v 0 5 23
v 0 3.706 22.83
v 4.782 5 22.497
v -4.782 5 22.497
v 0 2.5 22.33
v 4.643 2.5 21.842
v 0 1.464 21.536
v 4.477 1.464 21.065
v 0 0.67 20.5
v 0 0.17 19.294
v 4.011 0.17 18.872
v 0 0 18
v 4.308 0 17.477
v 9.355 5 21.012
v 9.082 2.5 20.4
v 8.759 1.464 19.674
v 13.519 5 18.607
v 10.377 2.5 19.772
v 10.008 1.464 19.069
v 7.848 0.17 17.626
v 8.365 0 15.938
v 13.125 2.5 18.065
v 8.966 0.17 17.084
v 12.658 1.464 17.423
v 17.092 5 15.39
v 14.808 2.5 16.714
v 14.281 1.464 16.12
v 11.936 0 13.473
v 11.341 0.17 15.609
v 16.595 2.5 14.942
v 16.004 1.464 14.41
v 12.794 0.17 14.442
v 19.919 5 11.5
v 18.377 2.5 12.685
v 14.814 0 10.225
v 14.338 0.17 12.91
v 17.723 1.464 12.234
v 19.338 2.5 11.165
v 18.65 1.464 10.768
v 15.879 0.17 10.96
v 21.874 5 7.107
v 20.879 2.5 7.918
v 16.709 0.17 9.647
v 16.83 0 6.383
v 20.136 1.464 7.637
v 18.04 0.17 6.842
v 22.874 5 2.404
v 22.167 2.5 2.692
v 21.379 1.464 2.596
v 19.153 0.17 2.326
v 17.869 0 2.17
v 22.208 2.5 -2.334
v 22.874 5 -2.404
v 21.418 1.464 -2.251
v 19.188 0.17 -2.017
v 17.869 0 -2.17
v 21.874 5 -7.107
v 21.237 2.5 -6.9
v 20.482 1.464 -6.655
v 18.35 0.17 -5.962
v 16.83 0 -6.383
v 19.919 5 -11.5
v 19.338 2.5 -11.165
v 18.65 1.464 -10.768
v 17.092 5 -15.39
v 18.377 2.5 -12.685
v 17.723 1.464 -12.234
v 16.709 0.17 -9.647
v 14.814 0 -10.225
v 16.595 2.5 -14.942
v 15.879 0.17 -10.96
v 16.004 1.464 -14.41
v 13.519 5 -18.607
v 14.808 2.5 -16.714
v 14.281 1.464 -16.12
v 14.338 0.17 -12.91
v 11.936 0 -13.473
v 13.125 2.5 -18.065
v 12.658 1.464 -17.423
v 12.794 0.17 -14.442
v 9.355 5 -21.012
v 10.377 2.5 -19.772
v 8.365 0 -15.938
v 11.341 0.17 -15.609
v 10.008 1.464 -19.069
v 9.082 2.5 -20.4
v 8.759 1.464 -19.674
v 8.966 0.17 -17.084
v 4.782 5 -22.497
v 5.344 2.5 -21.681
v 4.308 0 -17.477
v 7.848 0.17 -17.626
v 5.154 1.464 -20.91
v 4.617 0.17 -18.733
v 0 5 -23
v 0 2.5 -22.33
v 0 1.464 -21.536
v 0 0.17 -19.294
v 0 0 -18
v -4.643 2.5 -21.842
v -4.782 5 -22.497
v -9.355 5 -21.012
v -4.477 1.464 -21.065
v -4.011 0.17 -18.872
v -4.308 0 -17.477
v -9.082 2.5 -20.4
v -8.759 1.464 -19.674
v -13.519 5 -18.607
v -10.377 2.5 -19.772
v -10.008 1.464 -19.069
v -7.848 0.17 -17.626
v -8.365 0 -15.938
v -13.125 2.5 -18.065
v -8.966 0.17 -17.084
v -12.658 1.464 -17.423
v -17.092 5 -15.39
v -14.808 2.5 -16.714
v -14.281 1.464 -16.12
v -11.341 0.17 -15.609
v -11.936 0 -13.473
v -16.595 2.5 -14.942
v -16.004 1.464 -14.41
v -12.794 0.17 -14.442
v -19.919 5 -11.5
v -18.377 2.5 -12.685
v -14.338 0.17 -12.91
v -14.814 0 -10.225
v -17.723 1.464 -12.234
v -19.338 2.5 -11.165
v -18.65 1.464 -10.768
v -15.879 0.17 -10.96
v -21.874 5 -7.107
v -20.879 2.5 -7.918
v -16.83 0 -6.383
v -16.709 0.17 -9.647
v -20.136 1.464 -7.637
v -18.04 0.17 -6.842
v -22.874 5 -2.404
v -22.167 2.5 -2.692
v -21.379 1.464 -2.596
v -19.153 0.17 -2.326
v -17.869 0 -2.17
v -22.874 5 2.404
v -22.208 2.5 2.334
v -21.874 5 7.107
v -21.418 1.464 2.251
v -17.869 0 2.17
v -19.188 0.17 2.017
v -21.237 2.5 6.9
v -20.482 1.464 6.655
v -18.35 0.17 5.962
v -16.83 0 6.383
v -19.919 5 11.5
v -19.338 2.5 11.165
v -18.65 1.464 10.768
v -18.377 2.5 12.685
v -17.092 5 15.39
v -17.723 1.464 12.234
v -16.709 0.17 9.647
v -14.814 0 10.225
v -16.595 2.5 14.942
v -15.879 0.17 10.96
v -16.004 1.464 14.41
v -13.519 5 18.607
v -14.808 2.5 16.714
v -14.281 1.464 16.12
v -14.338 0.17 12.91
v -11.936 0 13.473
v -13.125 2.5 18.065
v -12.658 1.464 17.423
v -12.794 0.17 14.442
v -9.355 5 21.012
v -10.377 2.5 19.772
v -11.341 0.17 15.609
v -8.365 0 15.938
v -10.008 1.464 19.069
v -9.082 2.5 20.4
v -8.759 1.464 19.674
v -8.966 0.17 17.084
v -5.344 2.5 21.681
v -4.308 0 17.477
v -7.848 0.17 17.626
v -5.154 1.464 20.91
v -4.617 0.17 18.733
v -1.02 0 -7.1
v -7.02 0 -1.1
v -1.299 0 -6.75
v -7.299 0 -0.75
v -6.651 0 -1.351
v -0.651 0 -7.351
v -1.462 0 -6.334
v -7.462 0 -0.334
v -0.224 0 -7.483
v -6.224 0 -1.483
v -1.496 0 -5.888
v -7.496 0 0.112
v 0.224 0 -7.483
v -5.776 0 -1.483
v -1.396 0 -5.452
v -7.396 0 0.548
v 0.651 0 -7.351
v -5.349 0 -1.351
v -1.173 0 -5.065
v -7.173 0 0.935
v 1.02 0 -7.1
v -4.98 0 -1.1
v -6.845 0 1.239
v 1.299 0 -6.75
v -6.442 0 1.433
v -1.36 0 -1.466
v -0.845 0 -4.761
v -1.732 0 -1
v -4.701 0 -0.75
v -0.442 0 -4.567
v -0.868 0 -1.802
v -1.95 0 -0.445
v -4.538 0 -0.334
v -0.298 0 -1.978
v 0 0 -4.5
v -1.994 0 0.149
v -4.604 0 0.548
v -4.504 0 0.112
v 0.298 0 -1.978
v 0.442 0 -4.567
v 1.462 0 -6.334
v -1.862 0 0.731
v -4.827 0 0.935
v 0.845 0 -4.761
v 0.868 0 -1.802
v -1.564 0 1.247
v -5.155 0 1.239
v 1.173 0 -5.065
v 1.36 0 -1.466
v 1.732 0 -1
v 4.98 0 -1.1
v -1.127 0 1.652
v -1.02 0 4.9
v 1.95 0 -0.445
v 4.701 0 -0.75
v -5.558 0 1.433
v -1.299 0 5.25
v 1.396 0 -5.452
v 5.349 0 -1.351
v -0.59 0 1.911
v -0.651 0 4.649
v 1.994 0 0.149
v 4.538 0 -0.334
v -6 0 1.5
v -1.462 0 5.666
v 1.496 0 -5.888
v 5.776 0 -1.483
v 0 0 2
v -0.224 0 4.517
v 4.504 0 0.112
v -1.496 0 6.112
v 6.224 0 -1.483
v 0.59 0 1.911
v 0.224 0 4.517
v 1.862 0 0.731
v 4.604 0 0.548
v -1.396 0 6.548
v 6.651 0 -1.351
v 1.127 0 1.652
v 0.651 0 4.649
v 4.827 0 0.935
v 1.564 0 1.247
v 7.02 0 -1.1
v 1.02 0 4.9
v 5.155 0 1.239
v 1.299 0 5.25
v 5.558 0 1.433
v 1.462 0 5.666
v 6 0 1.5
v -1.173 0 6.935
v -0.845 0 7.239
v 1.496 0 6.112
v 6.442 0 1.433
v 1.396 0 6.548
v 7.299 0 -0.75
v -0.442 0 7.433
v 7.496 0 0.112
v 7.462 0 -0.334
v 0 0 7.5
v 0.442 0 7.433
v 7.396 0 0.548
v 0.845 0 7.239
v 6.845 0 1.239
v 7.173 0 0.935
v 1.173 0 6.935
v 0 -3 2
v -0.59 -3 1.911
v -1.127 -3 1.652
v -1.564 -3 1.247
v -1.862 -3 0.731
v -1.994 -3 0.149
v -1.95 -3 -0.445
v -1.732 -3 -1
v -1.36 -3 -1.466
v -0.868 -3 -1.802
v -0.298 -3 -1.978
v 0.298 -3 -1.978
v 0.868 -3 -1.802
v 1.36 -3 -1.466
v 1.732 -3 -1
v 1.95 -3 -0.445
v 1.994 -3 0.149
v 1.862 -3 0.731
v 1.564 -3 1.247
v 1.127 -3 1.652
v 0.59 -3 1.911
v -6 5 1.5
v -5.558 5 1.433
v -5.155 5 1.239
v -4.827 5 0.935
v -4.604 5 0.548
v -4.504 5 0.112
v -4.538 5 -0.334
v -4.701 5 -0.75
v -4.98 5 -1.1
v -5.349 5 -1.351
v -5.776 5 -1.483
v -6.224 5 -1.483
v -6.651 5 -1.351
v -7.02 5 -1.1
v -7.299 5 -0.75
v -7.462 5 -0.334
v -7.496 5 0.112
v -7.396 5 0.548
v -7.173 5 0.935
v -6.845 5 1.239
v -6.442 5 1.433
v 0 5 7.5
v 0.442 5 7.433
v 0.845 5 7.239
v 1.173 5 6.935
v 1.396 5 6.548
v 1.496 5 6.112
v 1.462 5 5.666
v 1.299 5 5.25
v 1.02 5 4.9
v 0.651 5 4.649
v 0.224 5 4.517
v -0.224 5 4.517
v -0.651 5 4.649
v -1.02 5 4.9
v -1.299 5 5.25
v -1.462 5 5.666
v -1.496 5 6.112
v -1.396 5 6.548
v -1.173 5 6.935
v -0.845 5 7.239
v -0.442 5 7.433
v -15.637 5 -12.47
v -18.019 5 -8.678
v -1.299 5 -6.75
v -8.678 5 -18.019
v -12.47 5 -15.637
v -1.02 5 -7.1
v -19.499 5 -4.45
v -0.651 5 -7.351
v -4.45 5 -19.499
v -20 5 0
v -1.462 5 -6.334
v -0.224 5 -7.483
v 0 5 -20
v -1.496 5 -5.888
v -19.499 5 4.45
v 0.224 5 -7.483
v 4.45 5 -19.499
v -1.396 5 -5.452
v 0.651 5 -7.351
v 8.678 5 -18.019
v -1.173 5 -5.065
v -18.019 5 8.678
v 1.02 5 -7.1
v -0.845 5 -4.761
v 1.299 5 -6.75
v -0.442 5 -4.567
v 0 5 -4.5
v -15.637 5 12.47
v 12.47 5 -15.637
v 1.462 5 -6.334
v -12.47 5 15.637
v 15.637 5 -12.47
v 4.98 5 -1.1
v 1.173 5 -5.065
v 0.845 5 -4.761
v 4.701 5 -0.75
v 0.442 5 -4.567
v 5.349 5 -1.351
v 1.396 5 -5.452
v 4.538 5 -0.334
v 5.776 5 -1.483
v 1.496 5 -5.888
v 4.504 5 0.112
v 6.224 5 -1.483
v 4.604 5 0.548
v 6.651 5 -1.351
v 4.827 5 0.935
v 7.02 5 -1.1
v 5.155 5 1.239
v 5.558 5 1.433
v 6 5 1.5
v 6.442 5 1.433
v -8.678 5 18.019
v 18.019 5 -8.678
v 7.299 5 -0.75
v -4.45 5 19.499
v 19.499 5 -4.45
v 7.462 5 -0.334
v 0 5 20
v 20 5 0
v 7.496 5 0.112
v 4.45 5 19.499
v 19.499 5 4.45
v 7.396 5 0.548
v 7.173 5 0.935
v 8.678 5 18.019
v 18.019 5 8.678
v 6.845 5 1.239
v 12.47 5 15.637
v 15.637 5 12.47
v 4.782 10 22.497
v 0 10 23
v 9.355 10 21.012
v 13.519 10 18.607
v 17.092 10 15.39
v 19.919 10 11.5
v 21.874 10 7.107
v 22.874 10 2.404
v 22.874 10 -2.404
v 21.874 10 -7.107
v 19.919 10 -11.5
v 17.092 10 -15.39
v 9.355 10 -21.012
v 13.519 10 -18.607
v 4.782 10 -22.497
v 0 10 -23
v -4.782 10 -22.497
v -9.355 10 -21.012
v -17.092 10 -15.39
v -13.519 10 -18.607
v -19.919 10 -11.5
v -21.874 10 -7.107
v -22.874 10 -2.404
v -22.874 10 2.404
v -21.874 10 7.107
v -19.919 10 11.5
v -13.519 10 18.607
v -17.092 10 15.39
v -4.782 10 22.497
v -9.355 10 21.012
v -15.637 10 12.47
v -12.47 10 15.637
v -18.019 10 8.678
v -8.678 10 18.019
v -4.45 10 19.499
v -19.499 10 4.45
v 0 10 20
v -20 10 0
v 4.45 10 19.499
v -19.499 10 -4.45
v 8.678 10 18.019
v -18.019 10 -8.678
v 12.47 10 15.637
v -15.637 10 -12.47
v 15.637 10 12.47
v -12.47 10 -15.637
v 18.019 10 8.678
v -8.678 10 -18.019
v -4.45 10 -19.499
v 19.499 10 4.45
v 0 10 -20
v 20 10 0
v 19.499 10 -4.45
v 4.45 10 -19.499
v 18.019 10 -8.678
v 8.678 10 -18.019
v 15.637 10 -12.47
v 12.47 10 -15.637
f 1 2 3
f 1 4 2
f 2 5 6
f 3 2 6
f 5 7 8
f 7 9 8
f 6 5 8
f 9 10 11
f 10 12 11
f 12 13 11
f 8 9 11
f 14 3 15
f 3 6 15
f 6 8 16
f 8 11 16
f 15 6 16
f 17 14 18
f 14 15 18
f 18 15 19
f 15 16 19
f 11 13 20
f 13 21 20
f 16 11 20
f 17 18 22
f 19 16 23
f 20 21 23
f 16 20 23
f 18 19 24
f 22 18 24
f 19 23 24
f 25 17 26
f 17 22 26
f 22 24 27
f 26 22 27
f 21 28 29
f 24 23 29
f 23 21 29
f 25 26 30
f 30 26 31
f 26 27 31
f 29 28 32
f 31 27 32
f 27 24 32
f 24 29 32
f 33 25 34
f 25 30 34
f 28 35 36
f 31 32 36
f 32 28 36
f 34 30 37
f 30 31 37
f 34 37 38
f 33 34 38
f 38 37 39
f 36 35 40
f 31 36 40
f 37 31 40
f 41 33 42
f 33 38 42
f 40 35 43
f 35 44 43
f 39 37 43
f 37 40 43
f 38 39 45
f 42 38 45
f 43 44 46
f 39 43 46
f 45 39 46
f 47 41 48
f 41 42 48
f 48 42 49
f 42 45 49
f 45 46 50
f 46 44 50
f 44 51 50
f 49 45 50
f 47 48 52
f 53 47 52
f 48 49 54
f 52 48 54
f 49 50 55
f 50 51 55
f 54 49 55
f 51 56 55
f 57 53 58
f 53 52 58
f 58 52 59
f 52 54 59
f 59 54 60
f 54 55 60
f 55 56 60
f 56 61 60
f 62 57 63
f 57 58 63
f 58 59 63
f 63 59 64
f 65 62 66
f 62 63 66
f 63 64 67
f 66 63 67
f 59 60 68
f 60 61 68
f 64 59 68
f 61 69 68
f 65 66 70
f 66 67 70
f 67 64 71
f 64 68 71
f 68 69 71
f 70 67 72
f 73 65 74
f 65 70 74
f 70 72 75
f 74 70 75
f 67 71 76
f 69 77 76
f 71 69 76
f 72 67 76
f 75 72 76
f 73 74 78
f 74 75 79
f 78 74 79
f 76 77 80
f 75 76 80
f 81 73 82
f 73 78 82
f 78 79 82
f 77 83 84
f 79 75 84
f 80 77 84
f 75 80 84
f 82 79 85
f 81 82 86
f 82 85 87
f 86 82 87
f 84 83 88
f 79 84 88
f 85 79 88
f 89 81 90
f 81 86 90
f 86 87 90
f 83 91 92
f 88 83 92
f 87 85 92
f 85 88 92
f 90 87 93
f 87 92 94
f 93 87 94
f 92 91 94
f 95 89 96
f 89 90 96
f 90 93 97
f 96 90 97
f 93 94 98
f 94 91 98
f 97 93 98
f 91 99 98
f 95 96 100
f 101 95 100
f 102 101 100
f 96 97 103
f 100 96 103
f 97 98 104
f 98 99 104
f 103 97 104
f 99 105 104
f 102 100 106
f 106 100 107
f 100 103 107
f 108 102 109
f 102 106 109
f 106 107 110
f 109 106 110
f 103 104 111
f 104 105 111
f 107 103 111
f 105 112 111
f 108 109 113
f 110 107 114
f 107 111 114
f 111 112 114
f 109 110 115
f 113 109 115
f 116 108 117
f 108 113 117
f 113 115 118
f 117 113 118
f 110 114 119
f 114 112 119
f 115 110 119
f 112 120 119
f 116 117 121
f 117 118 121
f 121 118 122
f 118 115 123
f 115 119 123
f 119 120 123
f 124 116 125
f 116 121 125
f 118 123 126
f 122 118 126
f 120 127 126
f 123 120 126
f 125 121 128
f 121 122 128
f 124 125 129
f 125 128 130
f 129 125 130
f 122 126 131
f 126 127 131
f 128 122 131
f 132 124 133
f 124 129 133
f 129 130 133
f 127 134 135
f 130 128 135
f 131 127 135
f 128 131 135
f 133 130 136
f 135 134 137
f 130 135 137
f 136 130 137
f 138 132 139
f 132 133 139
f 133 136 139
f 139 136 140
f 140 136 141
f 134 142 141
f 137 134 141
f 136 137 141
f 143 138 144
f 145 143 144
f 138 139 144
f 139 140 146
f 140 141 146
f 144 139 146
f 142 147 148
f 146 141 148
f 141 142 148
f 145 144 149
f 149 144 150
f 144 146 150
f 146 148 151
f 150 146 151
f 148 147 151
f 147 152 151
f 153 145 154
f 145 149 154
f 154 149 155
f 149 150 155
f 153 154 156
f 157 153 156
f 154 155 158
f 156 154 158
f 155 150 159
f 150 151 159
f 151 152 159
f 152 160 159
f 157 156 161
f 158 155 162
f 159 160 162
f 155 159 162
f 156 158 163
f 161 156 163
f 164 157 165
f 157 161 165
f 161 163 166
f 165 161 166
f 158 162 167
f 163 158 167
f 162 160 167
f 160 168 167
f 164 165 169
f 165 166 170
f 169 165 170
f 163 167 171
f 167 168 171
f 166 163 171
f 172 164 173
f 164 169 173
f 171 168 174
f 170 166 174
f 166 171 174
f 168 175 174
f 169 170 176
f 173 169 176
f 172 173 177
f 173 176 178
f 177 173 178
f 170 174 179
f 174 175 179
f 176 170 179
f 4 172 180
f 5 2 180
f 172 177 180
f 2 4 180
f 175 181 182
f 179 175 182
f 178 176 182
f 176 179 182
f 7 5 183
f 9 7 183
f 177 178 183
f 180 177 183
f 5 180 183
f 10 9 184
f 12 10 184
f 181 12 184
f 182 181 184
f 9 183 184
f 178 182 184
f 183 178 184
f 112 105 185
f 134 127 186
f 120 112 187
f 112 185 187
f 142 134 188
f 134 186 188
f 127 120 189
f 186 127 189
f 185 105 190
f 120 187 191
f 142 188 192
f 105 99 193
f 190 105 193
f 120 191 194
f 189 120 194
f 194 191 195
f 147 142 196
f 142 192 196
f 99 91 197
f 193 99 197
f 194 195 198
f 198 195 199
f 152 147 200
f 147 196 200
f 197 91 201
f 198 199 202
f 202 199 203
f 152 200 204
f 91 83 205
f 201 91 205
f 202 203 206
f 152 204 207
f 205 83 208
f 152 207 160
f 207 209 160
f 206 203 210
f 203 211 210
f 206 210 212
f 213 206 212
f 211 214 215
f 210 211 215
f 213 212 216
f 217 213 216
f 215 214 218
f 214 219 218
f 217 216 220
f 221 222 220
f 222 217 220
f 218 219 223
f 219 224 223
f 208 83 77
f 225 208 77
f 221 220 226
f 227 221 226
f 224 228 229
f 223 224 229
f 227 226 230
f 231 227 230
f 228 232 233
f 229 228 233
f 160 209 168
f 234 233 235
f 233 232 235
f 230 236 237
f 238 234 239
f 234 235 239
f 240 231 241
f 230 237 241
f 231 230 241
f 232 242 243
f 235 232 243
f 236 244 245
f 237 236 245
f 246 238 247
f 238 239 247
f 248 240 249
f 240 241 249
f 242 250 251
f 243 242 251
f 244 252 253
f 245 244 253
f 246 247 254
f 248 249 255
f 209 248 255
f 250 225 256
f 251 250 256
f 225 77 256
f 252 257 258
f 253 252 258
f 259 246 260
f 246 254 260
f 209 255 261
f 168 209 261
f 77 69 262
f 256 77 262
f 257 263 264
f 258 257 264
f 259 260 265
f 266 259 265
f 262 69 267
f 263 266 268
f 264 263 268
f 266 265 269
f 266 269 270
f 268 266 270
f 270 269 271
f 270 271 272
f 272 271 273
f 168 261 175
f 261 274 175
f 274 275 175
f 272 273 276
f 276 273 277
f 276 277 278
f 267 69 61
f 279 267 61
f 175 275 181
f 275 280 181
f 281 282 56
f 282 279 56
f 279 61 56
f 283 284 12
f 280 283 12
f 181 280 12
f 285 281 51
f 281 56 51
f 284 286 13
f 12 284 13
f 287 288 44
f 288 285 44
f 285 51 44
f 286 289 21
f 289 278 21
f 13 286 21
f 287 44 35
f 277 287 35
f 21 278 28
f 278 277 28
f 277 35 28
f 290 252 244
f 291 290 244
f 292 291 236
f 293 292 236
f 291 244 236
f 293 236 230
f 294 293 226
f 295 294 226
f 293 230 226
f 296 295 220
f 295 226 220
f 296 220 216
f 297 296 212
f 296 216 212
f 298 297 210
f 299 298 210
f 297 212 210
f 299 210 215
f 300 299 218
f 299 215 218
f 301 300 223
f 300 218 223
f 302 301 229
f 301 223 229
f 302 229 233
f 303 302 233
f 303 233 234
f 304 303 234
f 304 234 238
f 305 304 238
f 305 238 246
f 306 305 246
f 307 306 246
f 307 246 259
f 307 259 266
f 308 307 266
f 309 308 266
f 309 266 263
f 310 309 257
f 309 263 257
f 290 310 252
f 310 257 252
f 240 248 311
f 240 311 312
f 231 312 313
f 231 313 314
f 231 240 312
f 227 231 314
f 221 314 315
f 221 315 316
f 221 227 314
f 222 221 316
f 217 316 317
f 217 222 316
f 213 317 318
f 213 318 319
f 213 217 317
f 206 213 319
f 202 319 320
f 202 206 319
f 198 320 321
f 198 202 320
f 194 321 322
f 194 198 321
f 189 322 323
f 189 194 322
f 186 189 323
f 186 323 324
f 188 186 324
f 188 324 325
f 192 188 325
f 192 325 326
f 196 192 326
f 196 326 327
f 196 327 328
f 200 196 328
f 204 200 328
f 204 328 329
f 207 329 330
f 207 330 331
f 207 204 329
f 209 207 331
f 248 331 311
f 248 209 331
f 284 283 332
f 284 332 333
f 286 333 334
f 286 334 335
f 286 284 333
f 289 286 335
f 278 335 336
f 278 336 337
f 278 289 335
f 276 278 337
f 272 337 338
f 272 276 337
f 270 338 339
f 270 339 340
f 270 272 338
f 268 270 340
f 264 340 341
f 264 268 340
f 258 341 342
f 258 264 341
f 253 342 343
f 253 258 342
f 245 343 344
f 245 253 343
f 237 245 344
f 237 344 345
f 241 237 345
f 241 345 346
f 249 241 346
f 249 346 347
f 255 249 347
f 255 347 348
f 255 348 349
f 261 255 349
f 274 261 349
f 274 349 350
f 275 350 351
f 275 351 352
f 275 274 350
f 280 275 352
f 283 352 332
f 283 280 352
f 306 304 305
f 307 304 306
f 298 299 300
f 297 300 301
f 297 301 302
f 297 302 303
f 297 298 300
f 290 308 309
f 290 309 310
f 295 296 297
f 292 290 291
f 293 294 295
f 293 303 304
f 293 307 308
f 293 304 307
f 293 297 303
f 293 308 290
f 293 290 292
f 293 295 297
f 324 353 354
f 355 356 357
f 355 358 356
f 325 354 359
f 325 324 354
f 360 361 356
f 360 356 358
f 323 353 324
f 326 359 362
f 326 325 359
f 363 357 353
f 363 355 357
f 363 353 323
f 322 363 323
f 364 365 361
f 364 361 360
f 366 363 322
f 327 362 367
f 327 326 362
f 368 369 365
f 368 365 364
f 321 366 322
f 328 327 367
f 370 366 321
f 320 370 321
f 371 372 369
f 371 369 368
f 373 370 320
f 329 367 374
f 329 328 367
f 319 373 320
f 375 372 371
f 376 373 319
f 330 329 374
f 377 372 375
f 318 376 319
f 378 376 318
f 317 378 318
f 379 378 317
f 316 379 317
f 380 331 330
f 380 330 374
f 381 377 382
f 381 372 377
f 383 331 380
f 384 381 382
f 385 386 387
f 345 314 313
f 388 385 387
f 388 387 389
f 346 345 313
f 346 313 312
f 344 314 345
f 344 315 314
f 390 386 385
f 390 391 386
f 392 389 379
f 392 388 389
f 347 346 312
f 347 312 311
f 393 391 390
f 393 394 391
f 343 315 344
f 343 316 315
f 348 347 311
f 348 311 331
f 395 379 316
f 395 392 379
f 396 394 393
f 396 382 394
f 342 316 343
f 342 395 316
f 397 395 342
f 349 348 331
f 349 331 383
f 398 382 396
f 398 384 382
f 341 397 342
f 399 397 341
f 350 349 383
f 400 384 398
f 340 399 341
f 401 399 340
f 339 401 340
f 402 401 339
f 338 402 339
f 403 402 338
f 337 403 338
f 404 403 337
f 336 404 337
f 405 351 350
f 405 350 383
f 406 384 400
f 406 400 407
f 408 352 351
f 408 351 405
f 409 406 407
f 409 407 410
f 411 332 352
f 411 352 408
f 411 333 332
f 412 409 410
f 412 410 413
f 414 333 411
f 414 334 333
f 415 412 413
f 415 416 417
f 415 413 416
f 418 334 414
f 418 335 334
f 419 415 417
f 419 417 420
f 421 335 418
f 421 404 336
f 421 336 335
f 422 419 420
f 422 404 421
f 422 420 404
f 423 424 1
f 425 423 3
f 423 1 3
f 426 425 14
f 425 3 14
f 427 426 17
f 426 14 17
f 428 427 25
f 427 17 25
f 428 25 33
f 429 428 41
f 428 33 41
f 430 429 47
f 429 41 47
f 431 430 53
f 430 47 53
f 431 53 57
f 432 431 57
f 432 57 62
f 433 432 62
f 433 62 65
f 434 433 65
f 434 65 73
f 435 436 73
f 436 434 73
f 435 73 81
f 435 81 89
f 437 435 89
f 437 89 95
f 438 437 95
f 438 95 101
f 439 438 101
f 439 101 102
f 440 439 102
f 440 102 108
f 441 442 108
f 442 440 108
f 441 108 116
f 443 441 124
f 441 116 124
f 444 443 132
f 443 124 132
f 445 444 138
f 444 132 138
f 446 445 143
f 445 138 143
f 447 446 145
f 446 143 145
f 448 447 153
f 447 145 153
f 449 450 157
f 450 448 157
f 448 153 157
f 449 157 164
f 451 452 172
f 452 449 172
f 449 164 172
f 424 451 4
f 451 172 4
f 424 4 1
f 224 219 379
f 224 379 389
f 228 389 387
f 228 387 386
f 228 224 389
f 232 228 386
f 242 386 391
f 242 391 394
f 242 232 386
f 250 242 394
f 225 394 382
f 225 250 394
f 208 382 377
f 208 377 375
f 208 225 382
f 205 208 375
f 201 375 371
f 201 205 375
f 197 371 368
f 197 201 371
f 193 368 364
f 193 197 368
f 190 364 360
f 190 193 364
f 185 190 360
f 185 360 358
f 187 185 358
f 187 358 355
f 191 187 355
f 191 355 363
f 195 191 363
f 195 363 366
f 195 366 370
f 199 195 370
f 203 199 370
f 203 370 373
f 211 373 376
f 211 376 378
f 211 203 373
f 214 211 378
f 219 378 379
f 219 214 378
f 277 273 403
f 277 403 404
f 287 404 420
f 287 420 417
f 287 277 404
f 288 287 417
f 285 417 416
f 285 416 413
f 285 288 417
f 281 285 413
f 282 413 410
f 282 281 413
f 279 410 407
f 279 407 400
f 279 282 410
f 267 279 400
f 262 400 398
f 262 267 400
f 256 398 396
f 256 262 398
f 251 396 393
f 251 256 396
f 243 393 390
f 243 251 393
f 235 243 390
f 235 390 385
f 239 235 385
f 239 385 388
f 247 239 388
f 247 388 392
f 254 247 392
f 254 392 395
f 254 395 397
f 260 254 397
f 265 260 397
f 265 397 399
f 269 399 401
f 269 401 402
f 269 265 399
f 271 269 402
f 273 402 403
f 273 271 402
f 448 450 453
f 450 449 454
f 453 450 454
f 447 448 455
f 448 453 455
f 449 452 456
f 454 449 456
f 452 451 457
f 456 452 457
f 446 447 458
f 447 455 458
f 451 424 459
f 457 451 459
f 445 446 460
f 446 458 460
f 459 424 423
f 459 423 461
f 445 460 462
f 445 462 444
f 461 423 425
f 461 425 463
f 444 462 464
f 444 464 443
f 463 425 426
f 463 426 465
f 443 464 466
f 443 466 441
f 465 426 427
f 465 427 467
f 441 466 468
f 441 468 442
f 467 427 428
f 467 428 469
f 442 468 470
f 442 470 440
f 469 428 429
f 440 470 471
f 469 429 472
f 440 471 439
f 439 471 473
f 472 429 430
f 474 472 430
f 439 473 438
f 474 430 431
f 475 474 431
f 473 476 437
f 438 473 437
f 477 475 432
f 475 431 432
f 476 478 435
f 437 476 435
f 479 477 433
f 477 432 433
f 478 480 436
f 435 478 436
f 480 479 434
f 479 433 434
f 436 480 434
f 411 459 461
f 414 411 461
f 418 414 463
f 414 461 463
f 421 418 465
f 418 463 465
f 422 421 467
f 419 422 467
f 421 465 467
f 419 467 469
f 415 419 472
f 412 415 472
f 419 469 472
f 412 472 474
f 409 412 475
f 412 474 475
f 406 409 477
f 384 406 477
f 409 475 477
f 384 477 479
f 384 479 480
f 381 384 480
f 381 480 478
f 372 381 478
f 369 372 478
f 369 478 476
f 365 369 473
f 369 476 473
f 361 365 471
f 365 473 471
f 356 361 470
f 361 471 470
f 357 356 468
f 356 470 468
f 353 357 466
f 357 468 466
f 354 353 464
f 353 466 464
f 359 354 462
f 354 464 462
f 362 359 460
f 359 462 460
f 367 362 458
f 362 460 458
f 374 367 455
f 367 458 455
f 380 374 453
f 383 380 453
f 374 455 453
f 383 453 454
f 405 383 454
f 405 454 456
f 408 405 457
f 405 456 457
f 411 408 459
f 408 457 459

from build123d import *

# Parameters (mm, degrees)
SKETCH6_R           = 23
BOSS_EXTRUDE3_DEPTH = 25
SKETCH7_R           = 1.5
CUT_EXTRUDE2_DEPTH  = 5
SKETCH8_R           = 1.25
CUT_EXTRUDE3_DEPTH  = 5
SKETCH9_R           = 4
BOSS_EXTRUDE4_DEPTH = 2
SKETCH10_R          = 2
BOSS_EXTRUDE5_DEPTH = 3
FILLET1_R           = 5
FILLET2_R           = 2
SKETCH11_W          = 58.747444177
SKETCH11_H          = 21.595633685
CUT_EXTRUDE4_DEPTH  = 50
SKETCH12_R          = 20
CUT_EXTRUDE5_DEPTH  = 5


with BuildPart() as part:
    # Sketch6 → Boss-Extrude3 (new body)
    with BuildSketch(Plane(origin=(0, 0, 0), x_dir=(1, 0, 0), z_dir=(0, 1, 0))):
        with Locations(Location((0, 0, 0), (0, 0, 270))):
            Circle(SKETCH6_R)
    extrude(amount=BOSS_EXTRUDE3_DEPTH)

    # Sketch7 → Cut-Extrude2 (cut)
    with BuildSketch(Plane(origin=(0, 0, 0), x_dir=(1, 0, 0), z_dir=(0, 1, 0))):
        with Locations(Location((-6, 0, 0), (0, 0, 270))):
            Circle(SKETCH7_R)
        with Locations(Location((0, 6, 0), (0, 0, 270))):
            Circle(SKETCH7_R)
        with Locations(Location((6, 0, 0), (0, 0, 270))):
            Circle(SKETCH7_R)
        with Locations(Location((0, -6, 0), (0, 0, 270))):
            Circle(SKETCH7_R)
    extrude(amount=CUT_EXTRUDE2_DEPTH, mode=Mode.SUBTRACT)

    # Sketch8 → Cut-Extrude3 (cut)
    with BuildSketch(Plane(origin=(0, 25, 0), x_dir=(1, 0, 0), z_dir=(0, 1, 0))):
        with Locations(Location((-13.856406461, -8, 0), (0, 0, 270))):
            Circle(SKETCH8_R)
        with Locations(Location((0, 16, 0), (0, 0, 270))):
            Circle(SKETCH8_R)
        with Locations(Location((13.856406461, -8, 0), (0, 0, 270))):
            Circle(SKETCH8_R)
    extrude(amount=-CUT_EXTRUDE3_DEPTH, mode=Mode.SUBTRACT)

    # Sketch9 → Boss-Extrude4 (add)
    with BuildSketch(Plane(origin=(0, 25, 0), x_dir=(1, 0, 0), z_dir=(0, 1, 0))):
        with Locations(Location((0, 0, 0), (0, 0, 270))):
            Circle(SKETCH9_R)
    extrude(amount=BOSS_EXTRUDE4_DEPTH)

    # Sketch10 → Boss-Extrude5 (add)
    with BuildSketch(Plane.XZ):
        with Locations(Location((0, 0, 0), (0, 0, 90))):
            Circle(SKETCH10_R)
    extrude(amount=BOSS_EXTRUDE5_DEPTH)

    # Fillet1
    fillet1_edges = [part.edges().sort_by_distance(p)[0] for p in [
        (0, 0, -23),
    ]]
    fillet(fillet1_edges, radius=FILLET1_R)

    # Fillet2
    fillet2_edges = [part.edges().sort_by_distance(p)[0] for p in [
        (0, 25, -23),
    ]]
    fillet(fillet2_edges, radius=FILLET2_R)

    # Sketch11 → Cut-Extrude4 (cut, symmetric)
    with BuildSketch(Plane(origin=(0, 0, 0), x_dir=(0, 0, -1), z_dir=(1, 0, 0))):
        with Locations((0.983000007, 20.797816843)):
            Rectangle(SKETCH11_W, SKETCH11_H)
    extrude(amount=CUT_EXTRUDE4_DEPTH, both=True, mode=Mode.SUBTRACT)

    # Sketch12 → Cut-Extrude5 (cut)
    with BuildSketch(Plane(origin=(0, 10, 0), x_dir=(1, 0, 0), z_dir=(0, 1, 0))):
        with Locations(Location((0, 0, 0), (0, 0, 270))):
            Circle(SKETCH12_R)
    extrude(amount=-CUT_EXTRUDE5_DEPTH, mode=Mode.SUBTRACT)


solid = part.part
